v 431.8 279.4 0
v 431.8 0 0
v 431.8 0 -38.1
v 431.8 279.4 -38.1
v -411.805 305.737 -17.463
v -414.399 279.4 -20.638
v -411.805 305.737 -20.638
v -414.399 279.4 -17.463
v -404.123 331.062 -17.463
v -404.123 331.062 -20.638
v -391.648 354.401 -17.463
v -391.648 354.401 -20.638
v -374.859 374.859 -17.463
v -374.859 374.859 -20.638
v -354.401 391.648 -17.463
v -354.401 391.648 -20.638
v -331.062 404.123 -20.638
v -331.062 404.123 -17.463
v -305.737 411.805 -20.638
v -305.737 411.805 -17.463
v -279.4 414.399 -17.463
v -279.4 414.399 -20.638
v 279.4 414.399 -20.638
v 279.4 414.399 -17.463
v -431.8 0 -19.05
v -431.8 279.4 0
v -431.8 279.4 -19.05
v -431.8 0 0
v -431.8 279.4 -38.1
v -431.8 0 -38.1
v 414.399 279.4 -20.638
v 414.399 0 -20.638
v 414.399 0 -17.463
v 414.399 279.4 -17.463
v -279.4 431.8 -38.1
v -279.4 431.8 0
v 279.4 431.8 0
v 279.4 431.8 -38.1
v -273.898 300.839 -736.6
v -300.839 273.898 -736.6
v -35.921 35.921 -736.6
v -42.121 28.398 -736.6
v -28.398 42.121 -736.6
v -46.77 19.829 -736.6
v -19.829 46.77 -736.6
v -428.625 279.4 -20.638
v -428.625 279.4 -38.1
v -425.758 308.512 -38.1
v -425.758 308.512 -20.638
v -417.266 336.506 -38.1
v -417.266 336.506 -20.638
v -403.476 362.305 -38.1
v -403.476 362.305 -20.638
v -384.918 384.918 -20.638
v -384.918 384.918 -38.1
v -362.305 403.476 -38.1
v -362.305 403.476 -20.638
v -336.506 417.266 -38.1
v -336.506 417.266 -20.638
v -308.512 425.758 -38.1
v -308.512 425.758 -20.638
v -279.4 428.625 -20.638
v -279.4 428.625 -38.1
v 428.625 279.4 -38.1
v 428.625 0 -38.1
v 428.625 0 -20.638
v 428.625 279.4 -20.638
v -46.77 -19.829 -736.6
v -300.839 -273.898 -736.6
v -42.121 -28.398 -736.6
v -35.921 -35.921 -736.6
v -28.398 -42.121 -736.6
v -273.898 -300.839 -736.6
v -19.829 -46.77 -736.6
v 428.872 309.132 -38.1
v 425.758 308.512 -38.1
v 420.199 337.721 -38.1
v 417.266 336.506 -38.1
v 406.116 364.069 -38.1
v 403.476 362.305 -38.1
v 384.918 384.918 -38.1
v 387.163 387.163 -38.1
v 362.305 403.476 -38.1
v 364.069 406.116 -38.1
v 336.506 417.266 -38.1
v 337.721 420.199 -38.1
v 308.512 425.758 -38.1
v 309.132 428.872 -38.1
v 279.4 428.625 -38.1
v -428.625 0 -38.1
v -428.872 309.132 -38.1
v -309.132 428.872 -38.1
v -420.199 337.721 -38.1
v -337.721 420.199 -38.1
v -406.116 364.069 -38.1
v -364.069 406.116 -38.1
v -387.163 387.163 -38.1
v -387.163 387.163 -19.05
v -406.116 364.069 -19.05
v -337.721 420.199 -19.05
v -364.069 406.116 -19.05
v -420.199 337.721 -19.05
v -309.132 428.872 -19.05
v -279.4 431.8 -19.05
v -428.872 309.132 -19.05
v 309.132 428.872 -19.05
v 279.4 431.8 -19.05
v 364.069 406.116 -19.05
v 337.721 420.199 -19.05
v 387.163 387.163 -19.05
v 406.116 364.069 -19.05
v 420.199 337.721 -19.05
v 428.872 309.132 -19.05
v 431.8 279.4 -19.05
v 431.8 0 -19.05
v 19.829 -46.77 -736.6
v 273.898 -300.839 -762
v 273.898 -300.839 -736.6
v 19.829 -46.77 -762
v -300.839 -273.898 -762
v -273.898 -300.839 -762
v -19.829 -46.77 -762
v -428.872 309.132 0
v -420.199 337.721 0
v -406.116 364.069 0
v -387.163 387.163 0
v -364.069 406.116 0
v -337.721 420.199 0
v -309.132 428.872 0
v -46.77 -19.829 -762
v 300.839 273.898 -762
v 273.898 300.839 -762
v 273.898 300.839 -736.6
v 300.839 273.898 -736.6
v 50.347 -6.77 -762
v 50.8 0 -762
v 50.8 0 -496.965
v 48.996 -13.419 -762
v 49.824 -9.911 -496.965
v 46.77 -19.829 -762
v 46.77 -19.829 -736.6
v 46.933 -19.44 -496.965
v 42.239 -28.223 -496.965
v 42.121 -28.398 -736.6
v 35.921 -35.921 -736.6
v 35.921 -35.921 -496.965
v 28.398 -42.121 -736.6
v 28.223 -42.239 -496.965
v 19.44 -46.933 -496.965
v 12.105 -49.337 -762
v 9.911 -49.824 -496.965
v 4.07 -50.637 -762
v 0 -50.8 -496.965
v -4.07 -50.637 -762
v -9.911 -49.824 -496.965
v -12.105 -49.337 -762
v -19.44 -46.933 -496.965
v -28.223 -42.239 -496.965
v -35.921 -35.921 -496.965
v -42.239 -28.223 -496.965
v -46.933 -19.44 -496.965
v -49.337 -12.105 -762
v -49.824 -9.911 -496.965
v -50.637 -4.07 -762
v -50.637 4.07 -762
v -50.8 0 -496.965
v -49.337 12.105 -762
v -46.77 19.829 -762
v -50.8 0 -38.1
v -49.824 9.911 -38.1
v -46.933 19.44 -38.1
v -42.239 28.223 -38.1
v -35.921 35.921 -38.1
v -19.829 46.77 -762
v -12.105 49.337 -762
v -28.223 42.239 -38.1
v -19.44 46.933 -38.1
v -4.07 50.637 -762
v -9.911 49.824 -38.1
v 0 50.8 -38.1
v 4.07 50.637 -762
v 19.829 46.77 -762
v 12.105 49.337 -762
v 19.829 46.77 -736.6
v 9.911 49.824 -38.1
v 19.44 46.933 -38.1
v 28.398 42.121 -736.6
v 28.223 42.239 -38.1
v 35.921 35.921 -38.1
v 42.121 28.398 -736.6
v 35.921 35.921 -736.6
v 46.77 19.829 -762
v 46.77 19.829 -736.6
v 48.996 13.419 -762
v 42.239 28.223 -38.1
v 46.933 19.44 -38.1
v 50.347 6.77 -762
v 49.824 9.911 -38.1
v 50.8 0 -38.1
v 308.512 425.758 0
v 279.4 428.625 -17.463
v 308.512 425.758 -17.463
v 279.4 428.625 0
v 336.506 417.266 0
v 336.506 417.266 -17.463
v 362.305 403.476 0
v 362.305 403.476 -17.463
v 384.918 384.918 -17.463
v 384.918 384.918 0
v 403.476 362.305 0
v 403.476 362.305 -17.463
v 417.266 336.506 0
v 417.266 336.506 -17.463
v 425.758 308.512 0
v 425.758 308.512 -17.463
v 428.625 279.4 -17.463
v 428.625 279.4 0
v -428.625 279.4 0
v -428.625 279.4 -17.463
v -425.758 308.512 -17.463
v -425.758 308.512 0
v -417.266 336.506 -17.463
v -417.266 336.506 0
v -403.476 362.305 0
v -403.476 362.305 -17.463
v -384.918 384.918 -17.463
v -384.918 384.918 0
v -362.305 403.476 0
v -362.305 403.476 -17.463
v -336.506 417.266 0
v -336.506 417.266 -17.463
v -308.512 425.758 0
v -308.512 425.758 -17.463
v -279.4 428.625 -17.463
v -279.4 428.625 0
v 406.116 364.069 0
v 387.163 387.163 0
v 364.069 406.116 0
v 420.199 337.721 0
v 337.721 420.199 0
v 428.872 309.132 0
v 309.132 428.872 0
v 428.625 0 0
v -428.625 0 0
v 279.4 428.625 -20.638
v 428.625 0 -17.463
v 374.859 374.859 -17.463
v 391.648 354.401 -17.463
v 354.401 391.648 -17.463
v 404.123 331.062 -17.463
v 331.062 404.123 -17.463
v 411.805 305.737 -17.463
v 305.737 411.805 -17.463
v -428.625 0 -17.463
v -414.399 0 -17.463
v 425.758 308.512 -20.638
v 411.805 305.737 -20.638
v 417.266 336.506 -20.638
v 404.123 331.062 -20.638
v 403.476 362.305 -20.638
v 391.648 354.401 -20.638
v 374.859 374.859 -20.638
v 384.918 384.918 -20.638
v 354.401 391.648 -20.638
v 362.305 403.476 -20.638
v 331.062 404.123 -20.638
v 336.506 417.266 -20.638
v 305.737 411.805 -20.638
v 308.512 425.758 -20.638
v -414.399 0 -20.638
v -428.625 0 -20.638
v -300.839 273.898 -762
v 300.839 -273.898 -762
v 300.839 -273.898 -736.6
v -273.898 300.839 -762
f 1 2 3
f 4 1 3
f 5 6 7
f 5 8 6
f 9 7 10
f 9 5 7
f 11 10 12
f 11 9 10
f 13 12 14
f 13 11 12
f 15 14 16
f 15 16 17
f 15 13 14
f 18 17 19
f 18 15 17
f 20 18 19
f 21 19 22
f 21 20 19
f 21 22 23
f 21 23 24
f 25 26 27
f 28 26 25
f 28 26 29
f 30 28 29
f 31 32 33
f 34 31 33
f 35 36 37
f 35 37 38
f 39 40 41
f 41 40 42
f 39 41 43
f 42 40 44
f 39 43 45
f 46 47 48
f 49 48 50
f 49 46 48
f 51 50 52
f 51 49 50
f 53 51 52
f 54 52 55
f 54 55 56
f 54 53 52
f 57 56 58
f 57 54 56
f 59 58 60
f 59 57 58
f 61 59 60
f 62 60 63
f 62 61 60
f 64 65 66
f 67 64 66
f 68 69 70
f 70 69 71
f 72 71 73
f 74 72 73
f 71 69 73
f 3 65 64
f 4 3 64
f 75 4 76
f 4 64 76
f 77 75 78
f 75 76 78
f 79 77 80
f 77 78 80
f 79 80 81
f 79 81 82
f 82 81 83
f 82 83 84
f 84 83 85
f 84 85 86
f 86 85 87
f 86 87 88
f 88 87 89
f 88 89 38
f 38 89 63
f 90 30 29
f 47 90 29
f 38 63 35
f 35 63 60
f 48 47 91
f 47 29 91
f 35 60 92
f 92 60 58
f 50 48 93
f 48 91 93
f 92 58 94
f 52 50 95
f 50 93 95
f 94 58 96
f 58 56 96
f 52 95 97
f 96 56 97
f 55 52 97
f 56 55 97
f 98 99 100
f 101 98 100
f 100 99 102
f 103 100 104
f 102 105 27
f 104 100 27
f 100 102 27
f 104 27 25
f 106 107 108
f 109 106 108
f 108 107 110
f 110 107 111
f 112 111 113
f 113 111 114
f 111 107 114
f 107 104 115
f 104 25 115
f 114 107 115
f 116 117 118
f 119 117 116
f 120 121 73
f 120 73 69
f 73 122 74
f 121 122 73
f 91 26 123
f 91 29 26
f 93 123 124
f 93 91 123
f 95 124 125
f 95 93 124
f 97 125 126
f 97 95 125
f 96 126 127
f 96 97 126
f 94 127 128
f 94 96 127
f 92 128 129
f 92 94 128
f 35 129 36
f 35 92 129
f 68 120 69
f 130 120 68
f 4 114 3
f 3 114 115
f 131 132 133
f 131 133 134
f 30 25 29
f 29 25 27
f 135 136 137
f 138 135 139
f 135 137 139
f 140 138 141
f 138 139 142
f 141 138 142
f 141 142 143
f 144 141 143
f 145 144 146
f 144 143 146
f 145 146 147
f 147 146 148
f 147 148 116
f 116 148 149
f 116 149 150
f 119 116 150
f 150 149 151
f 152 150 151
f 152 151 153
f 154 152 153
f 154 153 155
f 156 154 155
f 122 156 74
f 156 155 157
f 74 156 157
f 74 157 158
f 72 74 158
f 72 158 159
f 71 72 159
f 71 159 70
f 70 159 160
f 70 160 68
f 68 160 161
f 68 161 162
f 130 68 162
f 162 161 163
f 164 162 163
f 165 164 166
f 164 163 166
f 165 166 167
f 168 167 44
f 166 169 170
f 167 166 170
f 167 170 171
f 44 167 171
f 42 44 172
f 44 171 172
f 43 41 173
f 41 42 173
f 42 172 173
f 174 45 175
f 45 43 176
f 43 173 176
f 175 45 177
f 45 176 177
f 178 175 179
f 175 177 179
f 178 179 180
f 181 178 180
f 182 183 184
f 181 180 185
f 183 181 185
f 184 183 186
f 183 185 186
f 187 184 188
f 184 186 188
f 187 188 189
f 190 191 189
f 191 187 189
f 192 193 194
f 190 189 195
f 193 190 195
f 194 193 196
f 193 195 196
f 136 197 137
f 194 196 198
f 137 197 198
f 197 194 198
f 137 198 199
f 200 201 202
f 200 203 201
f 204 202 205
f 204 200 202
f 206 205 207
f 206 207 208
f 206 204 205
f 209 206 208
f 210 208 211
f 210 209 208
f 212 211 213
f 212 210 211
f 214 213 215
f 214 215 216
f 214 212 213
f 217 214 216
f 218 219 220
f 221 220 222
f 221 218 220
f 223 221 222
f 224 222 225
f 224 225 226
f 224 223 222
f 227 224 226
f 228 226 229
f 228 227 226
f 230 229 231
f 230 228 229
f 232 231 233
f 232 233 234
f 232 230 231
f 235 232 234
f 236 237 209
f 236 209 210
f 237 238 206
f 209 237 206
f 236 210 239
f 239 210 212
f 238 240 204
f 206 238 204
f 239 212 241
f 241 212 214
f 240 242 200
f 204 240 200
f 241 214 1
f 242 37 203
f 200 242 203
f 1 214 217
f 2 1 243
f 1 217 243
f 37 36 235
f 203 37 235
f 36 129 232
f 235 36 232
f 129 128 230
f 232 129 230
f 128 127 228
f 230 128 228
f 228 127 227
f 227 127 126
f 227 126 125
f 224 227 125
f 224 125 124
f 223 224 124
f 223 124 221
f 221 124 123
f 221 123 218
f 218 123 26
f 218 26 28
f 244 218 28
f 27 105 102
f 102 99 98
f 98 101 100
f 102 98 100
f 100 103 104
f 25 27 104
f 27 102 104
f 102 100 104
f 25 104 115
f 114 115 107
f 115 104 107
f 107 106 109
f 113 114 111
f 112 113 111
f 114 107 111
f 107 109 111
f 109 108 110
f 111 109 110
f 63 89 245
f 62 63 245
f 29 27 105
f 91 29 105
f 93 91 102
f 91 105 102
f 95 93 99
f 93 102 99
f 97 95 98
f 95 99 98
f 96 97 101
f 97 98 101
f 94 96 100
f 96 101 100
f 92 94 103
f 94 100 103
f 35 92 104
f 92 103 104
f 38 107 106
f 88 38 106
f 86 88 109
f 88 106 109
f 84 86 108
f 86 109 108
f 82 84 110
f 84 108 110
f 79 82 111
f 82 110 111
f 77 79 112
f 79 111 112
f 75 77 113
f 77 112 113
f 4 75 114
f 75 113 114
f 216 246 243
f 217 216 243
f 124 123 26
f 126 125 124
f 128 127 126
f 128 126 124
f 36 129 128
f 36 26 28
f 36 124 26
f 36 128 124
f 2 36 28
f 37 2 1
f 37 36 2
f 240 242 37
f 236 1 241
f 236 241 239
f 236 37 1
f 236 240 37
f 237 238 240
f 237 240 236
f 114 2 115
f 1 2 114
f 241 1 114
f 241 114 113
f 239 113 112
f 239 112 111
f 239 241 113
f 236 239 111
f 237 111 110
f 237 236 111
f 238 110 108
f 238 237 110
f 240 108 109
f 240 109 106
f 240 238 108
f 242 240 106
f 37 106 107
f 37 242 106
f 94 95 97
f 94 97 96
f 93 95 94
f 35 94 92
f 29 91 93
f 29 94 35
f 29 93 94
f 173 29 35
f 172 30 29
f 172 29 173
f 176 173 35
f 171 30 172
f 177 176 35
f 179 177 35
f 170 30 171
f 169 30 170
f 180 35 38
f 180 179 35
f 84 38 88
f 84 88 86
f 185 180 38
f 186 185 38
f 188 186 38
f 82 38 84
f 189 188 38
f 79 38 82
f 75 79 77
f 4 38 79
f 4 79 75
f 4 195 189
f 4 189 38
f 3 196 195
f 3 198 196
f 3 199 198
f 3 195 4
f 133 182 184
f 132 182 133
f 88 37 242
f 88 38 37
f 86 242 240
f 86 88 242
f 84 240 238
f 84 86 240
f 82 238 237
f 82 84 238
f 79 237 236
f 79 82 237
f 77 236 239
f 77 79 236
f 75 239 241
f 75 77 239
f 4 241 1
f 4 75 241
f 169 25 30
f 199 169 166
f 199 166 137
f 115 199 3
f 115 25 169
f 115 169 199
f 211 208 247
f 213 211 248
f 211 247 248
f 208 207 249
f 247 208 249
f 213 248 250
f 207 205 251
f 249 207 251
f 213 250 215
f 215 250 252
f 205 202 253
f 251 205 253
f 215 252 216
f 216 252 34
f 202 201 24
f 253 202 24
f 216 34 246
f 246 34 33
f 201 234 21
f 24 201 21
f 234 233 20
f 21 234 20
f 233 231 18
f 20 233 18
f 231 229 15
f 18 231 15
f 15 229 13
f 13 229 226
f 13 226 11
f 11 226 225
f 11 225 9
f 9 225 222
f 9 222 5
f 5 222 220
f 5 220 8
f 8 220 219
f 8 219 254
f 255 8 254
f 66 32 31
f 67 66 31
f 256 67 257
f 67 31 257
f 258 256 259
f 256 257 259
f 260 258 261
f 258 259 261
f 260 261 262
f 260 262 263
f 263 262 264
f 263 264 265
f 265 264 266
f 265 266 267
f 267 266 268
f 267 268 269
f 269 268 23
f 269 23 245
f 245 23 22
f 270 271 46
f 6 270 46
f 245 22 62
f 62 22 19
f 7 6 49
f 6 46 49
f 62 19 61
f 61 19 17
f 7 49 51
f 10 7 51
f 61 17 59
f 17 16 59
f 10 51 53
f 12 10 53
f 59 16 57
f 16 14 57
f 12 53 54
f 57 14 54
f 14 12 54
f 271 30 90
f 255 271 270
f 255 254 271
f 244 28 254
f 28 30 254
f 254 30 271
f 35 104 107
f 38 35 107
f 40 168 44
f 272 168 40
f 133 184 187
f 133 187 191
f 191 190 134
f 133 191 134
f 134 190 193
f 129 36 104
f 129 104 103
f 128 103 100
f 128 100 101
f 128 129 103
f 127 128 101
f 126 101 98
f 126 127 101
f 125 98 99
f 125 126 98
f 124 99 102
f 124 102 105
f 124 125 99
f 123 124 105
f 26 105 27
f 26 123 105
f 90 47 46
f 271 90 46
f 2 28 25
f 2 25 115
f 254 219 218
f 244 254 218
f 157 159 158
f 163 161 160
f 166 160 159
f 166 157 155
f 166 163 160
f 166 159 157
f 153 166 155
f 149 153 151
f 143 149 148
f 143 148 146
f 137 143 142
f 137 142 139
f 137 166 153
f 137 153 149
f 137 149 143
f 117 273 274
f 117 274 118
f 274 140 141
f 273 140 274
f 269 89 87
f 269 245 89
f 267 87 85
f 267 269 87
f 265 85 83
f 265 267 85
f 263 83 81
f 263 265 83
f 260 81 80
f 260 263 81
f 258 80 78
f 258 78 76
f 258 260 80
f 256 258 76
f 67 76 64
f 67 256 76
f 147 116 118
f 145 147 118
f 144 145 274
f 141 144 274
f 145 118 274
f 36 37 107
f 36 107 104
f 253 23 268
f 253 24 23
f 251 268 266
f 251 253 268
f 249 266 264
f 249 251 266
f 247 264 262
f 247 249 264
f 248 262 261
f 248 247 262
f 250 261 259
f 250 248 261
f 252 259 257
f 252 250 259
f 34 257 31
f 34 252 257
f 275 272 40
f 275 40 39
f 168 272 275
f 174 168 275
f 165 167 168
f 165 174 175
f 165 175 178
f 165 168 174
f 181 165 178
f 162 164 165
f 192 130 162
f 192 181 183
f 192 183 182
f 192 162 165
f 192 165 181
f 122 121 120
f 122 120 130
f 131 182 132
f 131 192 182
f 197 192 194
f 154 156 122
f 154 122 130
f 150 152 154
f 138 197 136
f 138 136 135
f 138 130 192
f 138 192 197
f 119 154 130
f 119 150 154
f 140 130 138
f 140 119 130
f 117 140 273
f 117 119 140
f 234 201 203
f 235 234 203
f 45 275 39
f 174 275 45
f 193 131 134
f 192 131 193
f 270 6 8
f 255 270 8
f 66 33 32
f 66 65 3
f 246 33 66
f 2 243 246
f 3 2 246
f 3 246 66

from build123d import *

# Parameters (mm, degrees)
F1_DEPTH  = 19.05
F3_DEPTH  = 19.05
F4_W      = 14.2259423733
F4_H      = 3.175
F6_R      = 50.8
F7_DEPTH  = 723.9
F9_DEPTH  = 25.4
F10_W     = 1267.3492431641
F10_H     = 993.9301609993
F11_DEPTH = 914.4


with BuildPart() as f1:
    # F0 (on Top) → F1 (new body)
    with BuildSketch(Plane.XY):
        with BuildLine():
            Line((279.4, 431.8), (-279.4, 431.8))
            ThreePointArc((-279.4, 431.8), (-387.1630734528, 387.1630734528), (-431.8, 279.4))
            Line((-431.8, 279.4), (-431.8, -279.4))
            ThreePointArc((-431.8, -279.4), (-387.1630734528, -387.1630734528), (-279.4, -431.8))
            Line((-279.4, -431.8), (279.4, -431.8))
            ThreePointArc((279.4, -431.8), (387.1630734528, -387.1630734528), (431.8, -279.4))
            Line((431.8, -279.4), (431.8, 279.4))
            ThreePointArc((431.8, 279.4), (387.1630734528, 387.1630734528), (279.4, 431.8))
        make_face()
    extrude(amount=-F1_DEPTH)


with BuildPart() as f3:
    # F2 (on face) → F3 (new body)
    with BuildSketch(Plane(origin=(0, 0, -19.05), x_dir=(1, 0, 0), z_dir=(0, 0, -1))):
        with BuildLine():
            ThreePointArc((-279.4, 431.8), (-387.1630734528, 387.1630734528), (-431.8, 279.4))
            Line((-431.8, 279.4), (-431.8, -279.4))
            ThreePointArc((-431.8, -279.4), (-387.1630734528, -387.1630734528), (-279.4, -431.8))
            Line((-279.4, -431.8), (279.4, -431.8))
            ThreePointArc((279.4, -431.8), (387.1630734528, -387.1630734528), (431.8, -279.4))
            Line((431.8, -279.4), (431.8, 279.4))
            ThreePointArc((431.8, 279.4), (387.1630734528, 387.1630734528), (279.4, 431.8))
            Line((279.4, 431.8), (-279.4, 431.8))
        make_face()
    extrude(amount=F3_DEPTH)

    # F6 (on face) → F7 (join)
    with BuildSketch(Plane(origin=(0, 0, -38.1), x_dir=(1, 0, 0), z_dir=(0, 0, -1))):
        Circle(F6_R)
    extrude(amount=F7_DEPTH)

    # F8 (on face) → F9 (join)
    with BuildSketch(Plane(origin=(0, 0, -762), x_dir=(1, 0, 0), z_dir=(0, 0, -1))):
        Polygon((0, 0), (13.4703841816, 13.4703841816), (0, 26.9407683632), (-13.4703841816, 13.4703841816), align=None)
        Polygon((26.9407683632, 0), (13.4703841816, 13.4703841816), (0, 0), (13.4703841816, -13.4703841816), align=None)
        Polygon((0, 26.9407683632), (13.4703841816, 13.4703841816), (26.9407683632, 0), (300.8385800558, 273.8978116926), (273.8978116926, 300.8385800558), align=None)
        Polygon((-13.4703841816, 13.4703841816), (0, 26.9407683632), (-273.8978116926, 300.8385800558), (-300.8385800558, 273.8978116926), (-26.9407683632, 0), align=None)
        Polygon((13.4703841816, -13.4703841816), (0, 0), (-13.4703841816, -13.4703841816), (0, -26.9407683632), align=None)
        Polygon((-13.4703841816, -13.4703841816), (0, 0), (-13.4703841816, 13.4703841816), (-26.9407683632, 0), align=None)
        Polygon((300.8385800558, -273.8978116926), (26.9407683632, 0), (13.4703841816, -13.4703841816), (0, -26.9407683632), (273.8978116926, -300.8385800558), align=None)
        Polygon((0, -26.9407683632), (-13.4703841816, -13.4703841816), (-26.9407683632, 0), (-300.8385800558, -273.8978116926), (-273.8978116926, -300.8385800558), align=None)
    extrude(amount=-F9_DEPTH)


with BuildPart() as f5:
    # F5: sweep along a path in F5_path
    with BuildLine(Plane(origin=(279.4, -431.8, -19.05), x_dir=(0, -1, 0), z_dir=(0, 0, -1))) as f5_path:
        Line((0, 0), (0, 558.8))
        ThreePointArc((0, 558.8), (-44.6369265472, 666.5630734528), (-152.4, 711.2))
        Line((-152.4, 711.2), (-711.2, 711.2))
        ThreePointArc((-711.2, 711.2), (-818.9630734528, 666.5630734528), (-863.6, 558.8))
        Line((-863.6, 558.8), (-863.6, 0))
        ThreePointArc((-863.6, 0), (-818.9630734528, -107.7630734528), (-711.2, -152.4))
        Line((-711.2, -152.4), (-152.4, -152.4))
        ThreePointArc((-152.4, -152.4), (-44.6369265472, -107.7630734528), (0, 0))
    # F4 (on Front) → F5 (sweep)
    with BuildSketch(Plane.XZ):
        Polygon((-428.625, -17.4625), (-428.625, 0), (-431.8, 0), (-431.8, -19.05), (-431.8, -38.1), (-428.625, -38.1), (-428.625, -20.6375), align=None)
        with Locations((-421.5120288134, -19.05)):
            Rectangle(F4_W, F4_H)
    sweep(path=f5_path.line)


with BuildPart() as f11_tool:
    # F10 (on Front) → F11 (new body)
    with BuildSketch(Plane.XZ):
        Rectangle(F10_W, F10_H)
    extrude(amount=F11_DEPTH)


with BuildPart() as f1_1:
    add(f1.part)

    # F11: cut by f11_tool
    add(f11_tool.part, mode=Mode.SUBTRACT)


with BuildPart() as f3_1:
    add(f3.part)

    # F11: cut by f11_tool
    add(f11_tool.part, mode=Mode.SUBTRACT)


with BuildPart() as f5_1:
    add(f5.part)

    # F11: cut by f11_tool
    add(f11_tool.part, mode=Mode.SUBTRACT)


solid = Compound([f1_1.part, f3_1.part, f5_1.part])
